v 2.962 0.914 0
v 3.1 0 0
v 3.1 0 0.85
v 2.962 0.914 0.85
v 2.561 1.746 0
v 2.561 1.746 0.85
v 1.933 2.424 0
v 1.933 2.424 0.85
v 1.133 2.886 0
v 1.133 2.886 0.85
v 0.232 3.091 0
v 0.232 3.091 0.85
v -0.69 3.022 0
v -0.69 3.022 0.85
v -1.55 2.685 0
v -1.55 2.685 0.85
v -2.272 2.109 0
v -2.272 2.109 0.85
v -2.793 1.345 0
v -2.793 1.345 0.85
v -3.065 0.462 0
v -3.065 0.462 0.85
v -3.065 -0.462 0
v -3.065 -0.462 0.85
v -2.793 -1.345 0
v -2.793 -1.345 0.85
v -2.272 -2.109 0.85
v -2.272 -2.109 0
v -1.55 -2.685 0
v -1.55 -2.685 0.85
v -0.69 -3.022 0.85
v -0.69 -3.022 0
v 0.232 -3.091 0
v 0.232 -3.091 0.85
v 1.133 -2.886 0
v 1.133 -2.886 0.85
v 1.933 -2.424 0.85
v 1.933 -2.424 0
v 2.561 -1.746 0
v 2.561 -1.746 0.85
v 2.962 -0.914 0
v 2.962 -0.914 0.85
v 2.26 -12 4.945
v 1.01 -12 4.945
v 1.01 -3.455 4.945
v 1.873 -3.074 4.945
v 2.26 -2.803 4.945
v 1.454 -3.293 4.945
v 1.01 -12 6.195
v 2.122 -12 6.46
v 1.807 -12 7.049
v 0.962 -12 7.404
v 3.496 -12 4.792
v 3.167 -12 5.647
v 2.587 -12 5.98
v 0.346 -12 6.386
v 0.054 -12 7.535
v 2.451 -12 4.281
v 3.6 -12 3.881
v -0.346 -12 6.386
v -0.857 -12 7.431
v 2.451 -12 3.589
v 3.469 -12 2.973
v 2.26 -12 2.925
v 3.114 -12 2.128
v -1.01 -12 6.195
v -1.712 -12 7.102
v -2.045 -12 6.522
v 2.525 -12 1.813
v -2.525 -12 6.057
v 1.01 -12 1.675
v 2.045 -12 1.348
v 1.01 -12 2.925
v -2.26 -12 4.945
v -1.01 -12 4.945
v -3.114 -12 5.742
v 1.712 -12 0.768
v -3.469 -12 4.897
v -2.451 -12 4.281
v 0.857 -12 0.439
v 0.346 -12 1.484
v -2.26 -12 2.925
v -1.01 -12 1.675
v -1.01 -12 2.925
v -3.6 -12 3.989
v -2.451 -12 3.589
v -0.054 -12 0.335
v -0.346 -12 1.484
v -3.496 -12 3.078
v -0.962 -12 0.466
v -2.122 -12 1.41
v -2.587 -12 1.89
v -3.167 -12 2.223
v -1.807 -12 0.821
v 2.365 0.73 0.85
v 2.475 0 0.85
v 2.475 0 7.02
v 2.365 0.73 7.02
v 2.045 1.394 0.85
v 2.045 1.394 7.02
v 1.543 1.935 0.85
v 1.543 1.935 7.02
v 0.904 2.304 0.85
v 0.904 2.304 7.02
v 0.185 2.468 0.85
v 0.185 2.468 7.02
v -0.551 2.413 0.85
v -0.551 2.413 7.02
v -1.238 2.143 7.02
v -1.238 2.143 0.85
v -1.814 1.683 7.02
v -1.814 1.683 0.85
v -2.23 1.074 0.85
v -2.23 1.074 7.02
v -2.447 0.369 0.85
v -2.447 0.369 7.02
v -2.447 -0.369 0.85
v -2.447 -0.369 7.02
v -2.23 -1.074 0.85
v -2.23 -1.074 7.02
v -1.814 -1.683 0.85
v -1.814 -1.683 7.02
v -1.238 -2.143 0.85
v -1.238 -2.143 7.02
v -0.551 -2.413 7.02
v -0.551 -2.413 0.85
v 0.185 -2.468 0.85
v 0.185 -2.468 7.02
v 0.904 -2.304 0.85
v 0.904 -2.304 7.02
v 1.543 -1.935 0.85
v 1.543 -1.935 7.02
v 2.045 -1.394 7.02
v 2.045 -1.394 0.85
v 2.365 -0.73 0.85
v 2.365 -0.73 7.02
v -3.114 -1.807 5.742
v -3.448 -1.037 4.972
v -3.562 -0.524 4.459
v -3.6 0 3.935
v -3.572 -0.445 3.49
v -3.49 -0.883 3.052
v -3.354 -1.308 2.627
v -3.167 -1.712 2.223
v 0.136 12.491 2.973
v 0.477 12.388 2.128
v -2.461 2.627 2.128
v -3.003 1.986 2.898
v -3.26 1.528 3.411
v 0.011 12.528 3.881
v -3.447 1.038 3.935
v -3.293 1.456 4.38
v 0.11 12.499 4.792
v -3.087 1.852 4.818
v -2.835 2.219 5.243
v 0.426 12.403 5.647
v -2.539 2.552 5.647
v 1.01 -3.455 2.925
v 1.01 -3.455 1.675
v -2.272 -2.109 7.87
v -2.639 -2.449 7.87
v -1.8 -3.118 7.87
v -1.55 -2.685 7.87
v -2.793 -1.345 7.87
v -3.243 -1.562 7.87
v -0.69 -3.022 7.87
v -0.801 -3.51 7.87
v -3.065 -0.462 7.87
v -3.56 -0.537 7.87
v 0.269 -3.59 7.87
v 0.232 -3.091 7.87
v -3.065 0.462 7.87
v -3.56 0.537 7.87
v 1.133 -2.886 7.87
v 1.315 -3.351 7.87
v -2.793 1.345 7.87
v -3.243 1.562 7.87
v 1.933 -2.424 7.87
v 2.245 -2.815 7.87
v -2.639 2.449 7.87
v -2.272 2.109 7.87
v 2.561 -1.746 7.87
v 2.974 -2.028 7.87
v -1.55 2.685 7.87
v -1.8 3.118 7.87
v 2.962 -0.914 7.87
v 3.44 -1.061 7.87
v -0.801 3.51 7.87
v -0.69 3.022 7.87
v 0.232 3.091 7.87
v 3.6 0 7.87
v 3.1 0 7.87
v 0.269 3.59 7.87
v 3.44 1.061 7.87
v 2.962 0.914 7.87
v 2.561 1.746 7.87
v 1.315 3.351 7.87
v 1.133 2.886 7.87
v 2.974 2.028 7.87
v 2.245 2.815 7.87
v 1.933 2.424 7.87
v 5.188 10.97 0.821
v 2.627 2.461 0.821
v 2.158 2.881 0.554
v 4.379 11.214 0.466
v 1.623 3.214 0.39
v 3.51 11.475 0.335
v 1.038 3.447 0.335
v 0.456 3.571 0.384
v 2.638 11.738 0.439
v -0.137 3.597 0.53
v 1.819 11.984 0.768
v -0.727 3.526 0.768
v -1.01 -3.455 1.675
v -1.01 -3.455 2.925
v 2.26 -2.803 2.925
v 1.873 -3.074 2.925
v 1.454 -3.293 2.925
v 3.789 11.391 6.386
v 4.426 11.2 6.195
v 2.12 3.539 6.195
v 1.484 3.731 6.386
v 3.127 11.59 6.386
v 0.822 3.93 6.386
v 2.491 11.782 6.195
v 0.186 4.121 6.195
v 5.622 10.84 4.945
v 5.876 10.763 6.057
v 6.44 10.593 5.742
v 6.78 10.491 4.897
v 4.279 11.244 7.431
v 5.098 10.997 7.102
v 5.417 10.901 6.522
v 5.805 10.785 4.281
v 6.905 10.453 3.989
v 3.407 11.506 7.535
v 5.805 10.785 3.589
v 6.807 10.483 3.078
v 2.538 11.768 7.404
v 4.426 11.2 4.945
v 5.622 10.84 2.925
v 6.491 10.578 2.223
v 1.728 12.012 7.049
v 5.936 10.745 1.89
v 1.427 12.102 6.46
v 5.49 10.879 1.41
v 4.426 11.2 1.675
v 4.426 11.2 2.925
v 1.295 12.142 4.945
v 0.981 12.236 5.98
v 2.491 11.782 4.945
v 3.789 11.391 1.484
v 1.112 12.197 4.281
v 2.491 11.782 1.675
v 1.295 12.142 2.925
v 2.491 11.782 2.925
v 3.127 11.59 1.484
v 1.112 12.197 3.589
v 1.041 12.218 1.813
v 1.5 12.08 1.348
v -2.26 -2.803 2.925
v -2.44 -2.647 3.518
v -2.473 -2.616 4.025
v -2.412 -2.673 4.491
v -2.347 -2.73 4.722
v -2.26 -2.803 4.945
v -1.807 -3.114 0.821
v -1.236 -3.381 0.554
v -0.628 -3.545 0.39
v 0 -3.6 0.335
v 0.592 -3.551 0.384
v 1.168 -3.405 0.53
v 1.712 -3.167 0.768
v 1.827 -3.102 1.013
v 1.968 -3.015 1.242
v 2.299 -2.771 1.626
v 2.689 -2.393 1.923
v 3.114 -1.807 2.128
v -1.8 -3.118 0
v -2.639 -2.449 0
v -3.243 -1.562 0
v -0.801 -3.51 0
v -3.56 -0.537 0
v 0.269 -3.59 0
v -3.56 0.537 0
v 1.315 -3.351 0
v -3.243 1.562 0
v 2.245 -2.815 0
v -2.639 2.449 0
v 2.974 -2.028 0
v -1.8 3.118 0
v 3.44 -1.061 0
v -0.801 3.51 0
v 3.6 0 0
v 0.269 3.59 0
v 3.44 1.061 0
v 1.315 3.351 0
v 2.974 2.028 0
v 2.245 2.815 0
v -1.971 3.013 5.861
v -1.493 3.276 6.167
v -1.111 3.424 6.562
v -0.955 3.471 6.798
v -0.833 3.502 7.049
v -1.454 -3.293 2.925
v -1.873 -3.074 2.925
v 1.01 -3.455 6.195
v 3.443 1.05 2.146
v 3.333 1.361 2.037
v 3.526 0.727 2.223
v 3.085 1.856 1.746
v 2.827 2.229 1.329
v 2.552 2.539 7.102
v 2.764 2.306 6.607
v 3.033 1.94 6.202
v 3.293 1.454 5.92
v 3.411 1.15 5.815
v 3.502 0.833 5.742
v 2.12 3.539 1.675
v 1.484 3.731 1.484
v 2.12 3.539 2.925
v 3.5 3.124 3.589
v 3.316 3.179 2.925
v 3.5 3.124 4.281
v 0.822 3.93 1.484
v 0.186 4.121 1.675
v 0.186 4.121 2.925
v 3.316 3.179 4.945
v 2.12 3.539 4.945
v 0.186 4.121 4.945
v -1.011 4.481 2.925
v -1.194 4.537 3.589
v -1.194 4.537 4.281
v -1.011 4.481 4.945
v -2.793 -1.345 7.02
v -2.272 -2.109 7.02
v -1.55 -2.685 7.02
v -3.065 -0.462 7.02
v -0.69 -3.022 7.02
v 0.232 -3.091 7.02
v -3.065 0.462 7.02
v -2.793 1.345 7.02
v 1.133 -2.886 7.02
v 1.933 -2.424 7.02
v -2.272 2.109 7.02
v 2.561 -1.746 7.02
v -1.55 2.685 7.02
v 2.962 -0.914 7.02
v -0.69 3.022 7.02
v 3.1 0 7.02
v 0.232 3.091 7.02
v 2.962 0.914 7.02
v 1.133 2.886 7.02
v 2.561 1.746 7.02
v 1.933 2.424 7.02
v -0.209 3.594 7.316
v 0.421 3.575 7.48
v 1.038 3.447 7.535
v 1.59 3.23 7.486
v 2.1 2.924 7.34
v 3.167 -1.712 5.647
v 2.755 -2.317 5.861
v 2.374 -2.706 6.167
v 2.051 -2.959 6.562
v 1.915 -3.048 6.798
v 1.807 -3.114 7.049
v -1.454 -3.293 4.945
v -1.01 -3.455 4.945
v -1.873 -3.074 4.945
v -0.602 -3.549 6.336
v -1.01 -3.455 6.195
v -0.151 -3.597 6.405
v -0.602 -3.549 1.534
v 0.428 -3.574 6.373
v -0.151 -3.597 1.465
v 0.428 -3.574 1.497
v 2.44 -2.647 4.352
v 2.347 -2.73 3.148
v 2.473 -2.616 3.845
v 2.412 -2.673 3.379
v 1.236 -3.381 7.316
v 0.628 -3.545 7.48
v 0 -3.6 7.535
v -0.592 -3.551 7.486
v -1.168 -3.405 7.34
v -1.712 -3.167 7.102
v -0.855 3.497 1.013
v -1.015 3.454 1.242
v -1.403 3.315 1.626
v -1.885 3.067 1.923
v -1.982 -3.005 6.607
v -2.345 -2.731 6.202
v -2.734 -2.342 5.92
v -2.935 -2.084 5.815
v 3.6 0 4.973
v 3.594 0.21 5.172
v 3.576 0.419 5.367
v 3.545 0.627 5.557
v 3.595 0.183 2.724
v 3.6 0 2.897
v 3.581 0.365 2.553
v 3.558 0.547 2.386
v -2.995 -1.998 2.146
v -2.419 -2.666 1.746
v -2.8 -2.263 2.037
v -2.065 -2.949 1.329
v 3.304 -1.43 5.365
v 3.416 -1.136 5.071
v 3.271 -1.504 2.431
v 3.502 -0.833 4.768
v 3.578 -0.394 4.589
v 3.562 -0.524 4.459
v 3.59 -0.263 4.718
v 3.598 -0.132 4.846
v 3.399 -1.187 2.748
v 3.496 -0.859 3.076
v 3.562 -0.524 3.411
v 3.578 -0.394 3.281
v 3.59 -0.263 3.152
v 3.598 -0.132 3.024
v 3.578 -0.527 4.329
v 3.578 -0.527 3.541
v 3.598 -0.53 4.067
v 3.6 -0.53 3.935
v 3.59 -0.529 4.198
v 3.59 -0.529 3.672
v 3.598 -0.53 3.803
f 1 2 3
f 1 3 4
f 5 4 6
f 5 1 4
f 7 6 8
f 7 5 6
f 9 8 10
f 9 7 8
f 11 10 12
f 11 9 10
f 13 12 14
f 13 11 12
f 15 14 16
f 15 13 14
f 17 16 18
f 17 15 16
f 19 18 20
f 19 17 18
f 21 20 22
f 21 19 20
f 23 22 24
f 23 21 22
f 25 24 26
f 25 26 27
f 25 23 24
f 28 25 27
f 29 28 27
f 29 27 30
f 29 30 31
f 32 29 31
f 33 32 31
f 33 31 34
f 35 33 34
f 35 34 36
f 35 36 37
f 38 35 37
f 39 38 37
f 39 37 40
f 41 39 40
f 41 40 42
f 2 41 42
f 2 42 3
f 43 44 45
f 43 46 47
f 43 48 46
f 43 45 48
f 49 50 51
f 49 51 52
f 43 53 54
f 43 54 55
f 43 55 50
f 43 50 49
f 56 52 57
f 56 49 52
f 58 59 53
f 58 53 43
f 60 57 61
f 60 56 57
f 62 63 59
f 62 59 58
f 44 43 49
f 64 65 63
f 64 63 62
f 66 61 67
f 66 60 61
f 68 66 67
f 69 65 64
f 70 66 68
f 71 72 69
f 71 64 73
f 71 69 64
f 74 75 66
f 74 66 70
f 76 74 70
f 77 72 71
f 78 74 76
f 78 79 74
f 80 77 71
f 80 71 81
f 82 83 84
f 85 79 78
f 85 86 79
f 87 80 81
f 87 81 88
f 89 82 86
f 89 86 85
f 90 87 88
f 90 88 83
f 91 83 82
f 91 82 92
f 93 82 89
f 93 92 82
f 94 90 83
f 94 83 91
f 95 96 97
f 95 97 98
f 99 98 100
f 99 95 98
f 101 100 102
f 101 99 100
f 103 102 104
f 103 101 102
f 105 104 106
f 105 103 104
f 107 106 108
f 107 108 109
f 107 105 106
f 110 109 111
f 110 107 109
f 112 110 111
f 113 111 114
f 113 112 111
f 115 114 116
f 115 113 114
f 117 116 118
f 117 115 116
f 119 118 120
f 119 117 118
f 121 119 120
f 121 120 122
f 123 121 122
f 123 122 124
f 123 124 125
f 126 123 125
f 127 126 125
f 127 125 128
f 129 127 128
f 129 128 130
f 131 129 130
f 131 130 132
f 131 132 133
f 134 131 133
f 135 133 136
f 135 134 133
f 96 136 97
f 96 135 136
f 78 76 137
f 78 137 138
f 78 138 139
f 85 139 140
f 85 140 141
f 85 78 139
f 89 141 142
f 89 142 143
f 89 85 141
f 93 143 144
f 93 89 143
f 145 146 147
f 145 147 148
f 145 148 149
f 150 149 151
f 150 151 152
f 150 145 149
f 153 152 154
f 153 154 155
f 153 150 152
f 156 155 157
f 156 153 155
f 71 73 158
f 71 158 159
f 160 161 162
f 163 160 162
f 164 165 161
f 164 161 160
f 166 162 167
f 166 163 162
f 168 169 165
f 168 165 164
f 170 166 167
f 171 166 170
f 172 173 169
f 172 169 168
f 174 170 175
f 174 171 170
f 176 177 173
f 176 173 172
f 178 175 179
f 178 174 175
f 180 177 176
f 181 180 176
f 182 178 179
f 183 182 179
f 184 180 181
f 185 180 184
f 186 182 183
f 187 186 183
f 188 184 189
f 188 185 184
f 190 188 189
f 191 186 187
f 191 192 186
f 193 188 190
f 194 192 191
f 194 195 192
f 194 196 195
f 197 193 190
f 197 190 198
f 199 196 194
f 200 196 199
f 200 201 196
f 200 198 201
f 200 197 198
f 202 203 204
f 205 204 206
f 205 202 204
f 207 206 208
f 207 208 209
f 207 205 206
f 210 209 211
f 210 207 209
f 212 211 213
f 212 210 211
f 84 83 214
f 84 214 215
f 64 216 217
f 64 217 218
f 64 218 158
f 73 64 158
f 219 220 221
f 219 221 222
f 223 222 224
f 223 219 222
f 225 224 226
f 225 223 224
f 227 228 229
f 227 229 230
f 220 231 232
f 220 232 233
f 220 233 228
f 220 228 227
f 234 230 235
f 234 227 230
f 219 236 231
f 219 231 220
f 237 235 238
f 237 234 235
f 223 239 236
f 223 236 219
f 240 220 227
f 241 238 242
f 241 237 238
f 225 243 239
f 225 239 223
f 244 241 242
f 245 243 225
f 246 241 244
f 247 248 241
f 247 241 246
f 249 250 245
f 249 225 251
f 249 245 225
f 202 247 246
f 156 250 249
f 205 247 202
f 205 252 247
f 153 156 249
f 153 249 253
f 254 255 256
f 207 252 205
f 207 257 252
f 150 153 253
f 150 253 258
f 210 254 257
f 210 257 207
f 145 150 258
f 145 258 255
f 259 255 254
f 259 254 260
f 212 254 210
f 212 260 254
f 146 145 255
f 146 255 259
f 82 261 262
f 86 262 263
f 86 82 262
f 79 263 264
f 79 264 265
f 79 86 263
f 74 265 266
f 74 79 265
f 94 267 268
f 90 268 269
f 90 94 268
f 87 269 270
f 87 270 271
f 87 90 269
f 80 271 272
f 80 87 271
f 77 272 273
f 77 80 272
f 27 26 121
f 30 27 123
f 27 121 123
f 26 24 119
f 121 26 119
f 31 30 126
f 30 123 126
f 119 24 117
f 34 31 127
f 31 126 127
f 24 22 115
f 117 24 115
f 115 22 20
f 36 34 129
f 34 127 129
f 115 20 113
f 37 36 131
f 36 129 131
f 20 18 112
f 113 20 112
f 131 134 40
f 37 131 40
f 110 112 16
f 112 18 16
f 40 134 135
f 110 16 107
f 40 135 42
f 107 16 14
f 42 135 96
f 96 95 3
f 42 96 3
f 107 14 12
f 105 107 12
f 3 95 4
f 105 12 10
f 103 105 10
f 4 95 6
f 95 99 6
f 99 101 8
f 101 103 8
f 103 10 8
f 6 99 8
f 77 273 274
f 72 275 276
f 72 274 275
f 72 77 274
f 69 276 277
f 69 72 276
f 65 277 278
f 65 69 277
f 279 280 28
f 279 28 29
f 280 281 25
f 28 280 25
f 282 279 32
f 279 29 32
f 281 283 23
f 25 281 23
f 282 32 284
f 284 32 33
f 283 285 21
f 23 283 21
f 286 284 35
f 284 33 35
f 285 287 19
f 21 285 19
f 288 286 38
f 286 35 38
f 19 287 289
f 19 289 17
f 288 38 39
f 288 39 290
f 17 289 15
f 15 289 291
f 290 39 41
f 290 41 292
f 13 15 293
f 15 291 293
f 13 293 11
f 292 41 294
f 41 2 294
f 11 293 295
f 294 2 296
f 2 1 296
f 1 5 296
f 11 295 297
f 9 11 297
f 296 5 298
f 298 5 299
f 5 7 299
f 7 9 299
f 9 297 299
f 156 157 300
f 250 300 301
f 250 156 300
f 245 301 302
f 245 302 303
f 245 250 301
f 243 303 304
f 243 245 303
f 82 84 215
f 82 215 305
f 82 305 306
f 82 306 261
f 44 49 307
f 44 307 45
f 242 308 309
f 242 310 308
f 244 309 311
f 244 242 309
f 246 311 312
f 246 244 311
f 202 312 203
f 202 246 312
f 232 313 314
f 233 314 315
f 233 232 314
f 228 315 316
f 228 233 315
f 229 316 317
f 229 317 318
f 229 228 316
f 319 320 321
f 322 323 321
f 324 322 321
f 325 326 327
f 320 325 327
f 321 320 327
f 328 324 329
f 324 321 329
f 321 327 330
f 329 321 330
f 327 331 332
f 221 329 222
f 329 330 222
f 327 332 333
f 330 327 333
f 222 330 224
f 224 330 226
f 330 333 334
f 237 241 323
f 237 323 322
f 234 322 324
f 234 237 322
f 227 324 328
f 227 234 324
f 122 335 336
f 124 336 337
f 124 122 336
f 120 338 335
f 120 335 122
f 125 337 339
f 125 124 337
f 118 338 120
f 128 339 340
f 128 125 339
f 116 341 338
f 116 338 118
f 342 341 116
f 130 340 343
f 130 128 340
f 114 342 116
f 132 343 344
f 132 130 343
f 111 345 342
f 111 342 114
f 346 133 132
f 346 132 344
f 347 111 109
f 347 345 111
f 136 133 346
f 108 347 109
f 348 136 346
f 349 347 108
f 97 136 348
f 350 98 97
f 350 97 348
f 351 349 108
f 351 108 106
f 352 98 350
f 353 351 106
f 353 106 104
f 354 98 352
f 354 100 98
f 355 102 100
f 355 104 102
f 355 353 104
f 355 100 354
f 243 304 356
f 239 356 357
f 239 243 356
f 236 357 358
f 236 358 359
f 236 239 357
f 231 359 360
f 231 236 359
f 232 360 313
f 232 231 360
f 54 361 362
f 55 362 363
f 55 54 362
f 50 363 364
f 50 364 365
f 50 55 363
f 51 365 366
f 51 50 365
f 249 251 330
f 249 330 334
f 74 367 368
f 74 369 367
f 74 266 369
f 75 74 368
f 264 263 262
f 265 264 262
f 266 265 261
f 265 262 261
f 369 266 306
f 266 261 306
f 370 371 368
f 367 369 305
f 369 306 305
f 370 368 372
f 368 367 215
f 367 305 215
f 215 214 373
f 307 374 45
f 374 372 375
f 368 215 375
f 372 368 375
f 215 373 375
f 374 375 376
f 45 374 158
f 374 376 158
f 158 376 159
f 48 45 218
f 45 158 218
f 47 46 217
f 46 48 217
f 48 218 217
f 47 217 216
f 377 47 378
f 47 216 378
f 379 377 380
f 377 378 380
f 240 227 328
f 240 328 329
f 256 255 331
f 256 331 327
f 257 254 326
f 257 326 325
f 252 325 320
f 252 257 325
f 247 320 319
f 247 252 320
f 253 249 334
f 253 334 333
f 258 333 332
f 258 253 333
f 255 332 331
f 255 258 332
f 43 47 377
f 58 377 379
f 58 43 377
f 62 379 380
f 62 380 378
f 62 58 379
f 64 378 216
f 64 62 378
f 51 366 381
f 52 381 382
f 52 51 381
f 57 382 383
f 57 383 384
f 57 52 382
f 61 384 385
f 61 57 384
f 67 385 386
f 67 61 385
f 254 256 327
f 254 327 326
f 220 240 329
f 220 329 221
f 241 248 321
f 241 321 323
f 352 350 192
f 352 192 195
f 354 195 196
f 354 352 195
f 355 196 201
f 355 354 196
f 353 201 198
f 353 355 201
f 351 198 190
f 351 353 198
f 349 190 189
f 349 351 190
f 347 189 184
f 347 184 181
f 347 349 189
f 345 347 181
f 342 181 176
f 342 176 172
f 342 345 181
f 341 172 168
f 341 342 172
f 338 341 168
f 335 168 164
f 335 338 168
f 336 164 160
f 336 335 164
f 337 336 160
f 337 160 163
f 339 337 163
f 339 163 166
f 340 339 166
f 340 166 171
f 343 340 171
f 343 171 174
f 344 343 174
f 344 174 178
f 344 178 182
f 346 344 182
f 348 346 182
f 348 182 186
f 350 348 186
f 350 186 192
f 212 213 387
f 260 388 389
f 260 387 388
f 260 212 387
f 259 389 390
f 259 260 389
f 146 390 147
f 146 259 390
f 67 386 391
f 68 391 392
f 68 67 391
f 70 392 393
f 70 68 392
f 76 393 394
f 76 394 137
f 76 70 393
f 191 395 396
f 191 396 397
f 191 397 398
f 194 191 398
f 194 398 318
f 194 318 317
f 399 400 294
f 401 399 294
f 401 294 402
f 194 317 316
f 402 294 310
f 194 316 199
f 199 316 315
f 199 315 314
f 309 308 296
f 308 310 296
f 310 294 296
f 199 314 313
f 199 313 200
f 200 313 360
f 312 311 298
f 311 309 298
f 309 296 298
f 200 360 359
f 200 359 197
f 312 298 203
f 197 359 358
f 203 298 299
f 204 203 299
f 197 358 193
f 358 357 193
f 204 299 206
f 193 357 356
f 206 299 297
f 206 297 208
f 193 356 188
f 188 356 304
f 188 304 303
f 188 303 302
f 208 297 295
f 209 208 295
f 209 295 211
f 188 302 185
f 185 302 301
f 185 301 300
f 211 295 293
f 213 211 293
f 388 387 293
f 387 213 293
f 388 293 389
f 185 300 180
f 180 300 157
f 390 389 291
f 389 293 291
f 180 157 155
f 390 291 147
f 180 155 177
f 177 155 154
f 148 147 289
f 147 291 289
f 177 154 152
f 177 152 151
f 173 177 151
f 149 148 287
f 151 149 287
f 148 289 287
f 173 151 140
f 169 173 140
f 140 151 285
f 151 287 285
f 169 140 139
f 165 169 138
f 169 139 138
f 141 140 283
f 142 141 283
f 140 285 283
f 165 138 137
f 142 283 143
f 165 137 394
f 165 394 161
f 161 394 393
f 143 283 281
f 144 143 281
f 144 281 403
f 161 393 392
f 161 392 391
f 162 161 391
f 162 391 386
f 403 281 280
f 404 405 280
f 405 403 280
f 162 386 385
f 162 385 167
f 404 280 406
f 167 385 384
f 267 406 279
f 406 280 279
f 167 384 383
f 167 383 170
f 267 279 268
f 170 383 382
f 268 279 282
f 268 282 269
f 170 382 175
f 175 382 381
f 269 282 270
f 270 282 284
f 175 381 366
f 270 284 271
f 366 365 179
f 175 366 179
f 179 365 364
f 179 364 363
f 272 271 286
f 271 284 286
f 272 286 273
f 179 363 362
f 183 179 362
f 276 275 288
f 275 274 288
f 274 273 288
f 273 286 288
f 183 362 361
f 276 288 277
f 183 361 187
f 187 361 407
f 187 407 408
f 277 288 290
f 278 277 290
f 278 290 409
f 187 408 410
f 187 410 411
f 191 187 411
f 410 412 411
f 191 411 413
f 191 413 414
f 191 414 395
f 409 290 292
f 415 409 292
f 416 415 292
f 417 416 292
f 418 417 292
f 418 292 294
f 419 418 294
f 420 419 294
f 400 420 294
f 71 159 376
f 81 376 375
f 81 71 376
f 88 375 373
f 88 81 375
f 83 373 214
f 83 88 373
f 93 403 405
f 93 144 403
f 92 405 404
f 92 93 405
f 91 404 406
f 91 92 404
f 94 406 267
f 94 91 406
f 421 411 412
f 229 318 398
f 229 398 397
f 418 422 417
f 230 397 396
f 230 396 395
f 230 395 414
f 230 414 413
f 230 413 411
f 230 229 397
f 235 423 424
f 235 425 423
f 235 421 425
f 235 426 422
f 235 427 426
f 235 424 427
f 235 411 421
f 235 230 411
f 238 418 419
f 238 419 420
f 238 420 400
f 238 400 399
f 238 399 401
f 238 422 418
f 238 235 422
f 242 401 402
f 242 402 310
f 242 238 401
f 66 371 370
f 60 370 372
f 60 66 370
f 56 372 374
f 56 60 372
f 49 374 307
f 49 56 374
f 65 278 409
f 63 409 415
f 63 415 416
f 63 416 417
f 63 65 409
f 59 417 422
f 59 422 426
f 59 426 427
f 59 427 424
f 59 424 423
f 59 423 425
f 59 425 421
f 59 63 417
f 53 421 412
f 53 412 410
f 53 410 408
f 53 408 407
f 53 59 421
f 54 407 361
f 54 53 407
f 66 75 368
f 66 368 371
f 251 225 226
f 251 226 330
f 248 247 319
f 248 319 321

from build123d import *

# Parameters (mm, degrees)
CROQUIS1_R                   = 3.6
CROQUIS1_R_2                 = 3.1
SALIENTE_EXTRUIR1_DEPTH      = 7.87
SALIENTE_EXTRUIR2_START      = 0.85
CROQUIS1_3_R                 = 3.1
CROQUIS1_3_R_2               = 2.475
SALIENTE_EXTRUIR2_DEPTH      = 6.17
SALIENTE_EXTRUIR3_REACH      = 13.518
SALIENTE_EXTRUIR3_END_RADIUS = 3.6
SALIENTE_EXTRUIR4_START      = -8
SALIENTE_EXTRUIR4_DEPTH      = 8
SALIENTE_EXTRUIR5_REACH      = 20.306
SALIENTE_EXTRUIR5_END_RADIUS = 3.6
SALIENTE_EXTRUIR6_START      = -8
SALIENTE_EXTRUIR6_DEPTH      = 8


with BuildPart() as part:
    # Croquis1 → Saliente-Extruir1 (new body)
    with BuildSketch(Plane.XY):
        Circle(CROQUIS1_R)
        Circle(CROQUIS1_R_2, mode=Mode.SUBTRACT)
    extrude(amount=SALIENTE_EXTRUIR1_DEPTH)

    # Croquis1<3> → Saliente-Extruir2 (add)
    with BuildSketch(Plane.XY.offset(SALIENTE_EXTRUIR2_START)):
        Circle(CROQUIS1_3_R)
        Circle(CROQUIS1_3_R_2, mode=Mode.SUBTRACT)
    extrude(amount=SALIENTE_EXTRUIR2_DEPTH)

    # Saliente-Extruir3: up to this cylinder (the profile starts outside it)
    saliente_extruir3_end = Plane(origin=(0, 0, 6.19961), z_dir=(0, 0, -1)) * Cylinder(SALIENTE_EXTRUIR3_END_RADIUS, 35.236000000000004, mode=Mode.PRIVATE)
    # Croquis2 → Saliente-Extruir3 (add, up to the surface)
    with BuildSketch(Plane(origin=(0, -4, 0), x_dir=(1, 0, 0), z_dir=(0, 1, 0)), mode=Mode.PRIVATE) as saliente_extruir3_sk1:
        with BuildLine():
            ThreePointArc((-1.7124779696357202, -7.101610049171246), (0.05399392602494436, -7.534595068330939), (1.806684459564255, -7.048822612733265))
            ThreePointArc((1.806684459564255, -7.048822612733265), (2.337681630948243, -6.203587592595142), (3.1666100491712275, -5.647477969635754))
            ThreePointArc((3.1666100491712275, -5.647477969635754), (3.599595068330938, -3.881006073975069), (3.1138226127332604, -2.1283155404357355))
            ThreePointArc((3.1138226127332604, -2.1283155404357355), (2.268587592595135, -1.597318369051751), (1.7124779696357444, -0.7683899508287686))
            ThreePointArc((1.7124779696357444, -0.7683899508287686), (-0.0539939260249431, -0.3354049316690628), (-1.806684459564274, -0.8211773872667488))
            ThreePointArc((-1.806684459564274, -0.8211773872667488), (-2.337681630948256, -1.6664124074048765), (-3.166610049171237, -2.22252203036427))
            ThreePointArc((-3.166610049171237, -2.22252203036427), (-3.599595068330935, -3.9889939260249565), (-3.1138226127332462, -5.741684459564288))
            ThreePointArc((-3.1138226127332462, -5.741684459564288), (-2.268587592595116, -6.272681630948267), (-1.7124779696357202, -7.101610049171246))
        make_face()
        with BuildLine():
            Line((-1.01, -6.194540882568846), (-1.01, -4.944999999999999))
            Line((-1.01, -4.944999999999999), (-2.2595408825688463, -4.944999999999999))
            ThreePointArc((-2.2595408825688463, -4.944999999999999), (-2.475, -3.9349999999999996), (-2.2595408825688463, -2.9250000000000007))
            Line((-2.2595408825688463, -2.9250000000000007), (-1.01, -2.9250000000000007))
            Line((-1.01, -2.9250000000000007), (-1.01, -1.675459117431154))
            ThreePointArc((-1.01, -1.675459117431154), (1.5e-16, -1.4600000000000004), (1.01, -1.675459117431154))
            Line((1.01, -1.675459117431154), (1.01, -2.9250000000000007))
            Line((1.01, -2.9250000000000007), (2.2595408825688463, -2.9250000000000007))
            ThreePointArc((2.2595408825688463, -2.9250000000000007), (2.475, -3.935), (2.2595408825688463, -4.944999999999999))
            Line((2.2595408825688463, -4.944999999999999), (1.01, -4.944999999999999))
            Line((1.01, -4.944999999999999), (1.01, -6.194540882568846))
            ThreePointArc((1.01, -6.194540882568846), (1.5e-16, -6.41), (-1.01, -6.194540882568846))
        make_face(mode=Mode.SUBTRACT)
    saliente_extruir3_tool1 = extrude(saliente_extruir3_sk1.sketch, amount=SALIENTE_EXTRUIR3_REACH, mode=Mode.PRIVATE) - saliente_extruir3_end
    add(saliente_extruir3_tool1.solids().sort_by_distance((-2.197676, -4, 6.19961))[0])

    # Croquis2<3> → Saliente-Extruir4 (add)
    with BuildSketch(Plane(origin=(0, -4, 0), x_dir=(1, 0, 0), z_dir=(0, 1, 0)).offset(SALIENTE_EXTRUIR4_START)):
        with BuildLine():
            ThreePointArc((-3.166610049171237, -2.22252203036427), (-2.337681630948256, -1.6664124074048765), (-1.806684459564274, -0.8211773872667488))
            ThreePointArc((-1.806684459564274, -0.8211773872667488), (-0.0539939260249431, -0.3354049316690628), (1.7124779696357444, -0.7683899508287686))
            ThreePointArc((1.7124779696357444, -0.7683899508287686), (2.268587592595135, -1.597318369051751), (3.1138226127332604, -2.1283155404357355))
            ThreePointArc((3.1138226127332604, -2.1283155404357355), (3.599595068330938, -3.881006073975069), (3.1666100491712275, -5.647477969635754))
            ThreePointArc((3.1666100491712275, -5.647477969635754), (2.337681630948243, -6.203587592595142), (1.806684459564255, -7.048822612733265))
            ThreePointArc((1.806684459564255, -7.048822612733265), (0.05399392602494436, -7.534595068330939), (-1.7124779696357202, -7.101610049171246))
            ThreePointArc((-1.7124779696357202, -7.101610049171246), (-2.268587592595116, -6.272681630948267), (-3.1138226127332462, -5.741684459564288))
            ThreePointArc((-3.1138226127332462, -5.741684459564288), (-3.599595068330935, -3.9889939260249565), (-3.166610049171237, -2.22252203036427))
        make_face()
        with BuildLine():
            ThreePointArc((-2.2595408825688463, -2.9250000000000007), (-2.475, -3.9349999999999996), (-2.2595408825688463, -4.944999999999999))
            Line((-2.2595408825688463, -4.944999999999999), (-1.01, -4.944999999999999))
            Line((-1.01, -4.944999999999999), (-1.01, -6.194540882568846))
            ThreePointArc((-1.01, -6.194540882568846), (1.5e-16, -6.41), (1.01, -6.194540882568846))
            Line((1.01, -6.194540882568846), (1.01, -4.944999999999999))
            Line((1.01, -4.944999999999999), (2.2595408825688463, -4.944999999999999))
            ThreePointArc((2.2595408825688463, -4.944999999999999), (2.475, -3.935), (2.2595408825688463, -2.9250000000000007))
            Line((2.2595408825688463, -2.9250000000000007), (1.01, -2.9250000000000007))
            Line((1.01, -2.9250000000000007), (1.01, -1.675459117431154))
            ThreePointArc((1.01, -1.675459117431154), (1.5e-16, -1.4600000000000004), (-1.01, -1.675459117431154))
            Line((-1.01, -1.675459117431154), (-1.01, -2.9250000000000007))
            Line((-1.01, -2.9250000000000007), (-2.2595408825688463, -2.9250000000000007))
        make_face(mode=Mode.SUBTRACT)
    extrude(amount=SALIENTE_EXTRUIR4_DEPTH)

    # Saliente-Extruir5: up to this cylinder (the profile starts outside it)
    saliente_extruir5_end = Plane(origin=(0, 0, 3.935), z_dir=(0, 0, -1)) * Cylinder(SALIENTE_EXTRUIR5_END_RADIUS, 48.812000000000005, mode=Mode.PRIVATE)
    # Croquis7 → Saliente-Extruir5 (add, up to the surface)
    with BuildSketch(Plane(origin=(1.152785072536334, 3.830285443219265, 0), x_dir=(0, 0, 1), z_dir=(-0.2881962681340835, -0.9575713608048162, 0)), mode=Mode.PRIVATE) as saliente_extruir5_sk1:
        with BuildLine():
            ThreePointArc((2.222522030364279, -3.1666100491712452), (3.9889939260249445, -3.5995950683309377), (5.741684459564254, -3.113822612733264))
            ThreePointArc((5.741684459564254, -3.113822612733264), (6.272681630948287, -2.2685875925951686), (7.101610049171227, -1.7124779696357533))
            ThreePointArc((7.101610049171227, -1.7124779696357533), (7.534595068330938, 0.0539939260249318), (7.048822612733259, 1.8066844595642648))
            ThreePointArc((7.048822612733259, 1.8066844595642648), (6.203587592595132, 2.337681630948248), (5.647477969635745, 3.1666100491712332))
            ThreePointArc((5.647477969635745, 3.1666100491712332), (3.881006073975058, 3.599595068330939), (2.1283155404357252, 3.113822612733254))
            ThreePointArc((2.1283155404357252, 3.113822612733254), (1.5973183690517558, 2.268587592595114), (0.7683899508287607, 1.7124779696357326))
            ThreePointArc((0.7683899508287607, 1.7124779696357326), (0.33540493166906193, -0.05399392602495561), (0.8211773872667536, -1.8066844595642866))
            ThreePointArc((0.8211773872667536, -1.8066844595642866), (1.6664124074048823, -2.337681630948267), (2.222522030364279, -3.1666100491712452))
        make_face()
    saliente_extruir5_tool1 = extrude(saliente_extruir5_sk1.sketch, amount=SALIENTE_EXTRUIR5_REACH, mode=Mode.PRIVATE) - saliente_extruir5_end
    add(saliente_extruir5_tool1.solids().sort_by_distance((1.152785, 3.830285, 3.935))[0])

    # Croquis7<3> → Saliente-Extruir6 (add)
    with BuildSketch(Plane(origin=(1.152785072536334, 3.830285443219265, 0), x_dir=(0, 0, 1), z_dir=(-0.2881962681340835, -0.9575713608048162, 0)).offset(SALIENTE_EXTRUIR6_START)):
        with BuildLine():
            ThreePointArc((0.7683899508287607, 1.7124779696357326), (1.5973183690517558, 2.268587592595114), (2.1283155404357252, 3.113822612733254))
            ThreePointArc((2.1283155404357252, 3.113822612733254), (3.881006073975058, 3.599595068330939), (5.647477969635745, 3.1666100491712332))
            ThreePointArc((5.647477969635745, 3.1666100491712332), (6.203587592595132, 2.337681630948248), (7.048822612733259, 1.8066844595642648))
            ThreePointArc((7.048822612733259, 1.8066844595642648), (7.534595068330938, 0.0539939260249318), (7.101610049171227, -1.7124779696357533))
            ThreePointArc((7.101610049171227, -1.7124779696357533), (6.272681630948287, -2.2685875925951686), (5.741684459564254, -3.113822612733264))
            ThreePointArc((5.741684459564254, -3.113822612733264), (3.9889939260249445, -3.5995950683309377), (2.222522030364279, -3.1666100491712452))
            ThreePointArc((2.222522030364279, -3.1666100491712452), (1.6664124074048823, -2.337681630948267), (0.8211773872667536, -1.8066844595642866))
            ThreePointArc((0.8211773872667536, -1.8066844595642866), (0.33540493166906193, -0.05399392602495561), (0.7683899508287607, 1.7124779696357326))
        make_face()
        with BuildLine():
            ThreePointArc((1.675459117431154, 1.010000000000001), (1.4600000000000004, 1.17e-15), (1.675459117431154, -1.0099999999999991))
            Line((1.675459117431154, -1.0099999999999991), (2.925, -1.0099999999999991))
            Line((2.925, -1.0099999999999991), (2.925, -2.2595408825688454))
            ThreePointArc((2.925, -2.2595408825688454), (3.934999999999999, -2.474999999999999), (4.944999999999999, -2.259540882568846))
            Line((4.944999999999999, -2.259540882568846), (4.944999999999999, -1.009999999999999))
            Line((4.944999999999999, -1.009999999999999), (6.194540882568846, -1.0099999999999987))
            ThreePointArc((6.194540882568846, -1.0099999999999987), (6.41, 1e-15), (6.194540882568846, 1.010000000000001))
            Line((6.194540882568846, 1.010000000000001), (4.944999999999999, 1.010000000000001))
            Line((4.944999999999999, 1.010000000000001), (4.944999999999999, 2.259540882568847))
            ThreePointArc((4.944999999999999, 2.259540882568847), (3.9349999999999996, 2.475000000000001), (2.925, 2.2595408825688468))
            Line((2.925, 2.2595408825688468), (2.925, 1.010000000000001))
            Line((2.925, 1.010000000000001), (1.675459117431154, 1.010000000000001))
        make_face(mode=Mode.SUBTRACT)
    extrude(amount=SALIENTE_EXTRUIR6_DEPTH)


solid = part.part
